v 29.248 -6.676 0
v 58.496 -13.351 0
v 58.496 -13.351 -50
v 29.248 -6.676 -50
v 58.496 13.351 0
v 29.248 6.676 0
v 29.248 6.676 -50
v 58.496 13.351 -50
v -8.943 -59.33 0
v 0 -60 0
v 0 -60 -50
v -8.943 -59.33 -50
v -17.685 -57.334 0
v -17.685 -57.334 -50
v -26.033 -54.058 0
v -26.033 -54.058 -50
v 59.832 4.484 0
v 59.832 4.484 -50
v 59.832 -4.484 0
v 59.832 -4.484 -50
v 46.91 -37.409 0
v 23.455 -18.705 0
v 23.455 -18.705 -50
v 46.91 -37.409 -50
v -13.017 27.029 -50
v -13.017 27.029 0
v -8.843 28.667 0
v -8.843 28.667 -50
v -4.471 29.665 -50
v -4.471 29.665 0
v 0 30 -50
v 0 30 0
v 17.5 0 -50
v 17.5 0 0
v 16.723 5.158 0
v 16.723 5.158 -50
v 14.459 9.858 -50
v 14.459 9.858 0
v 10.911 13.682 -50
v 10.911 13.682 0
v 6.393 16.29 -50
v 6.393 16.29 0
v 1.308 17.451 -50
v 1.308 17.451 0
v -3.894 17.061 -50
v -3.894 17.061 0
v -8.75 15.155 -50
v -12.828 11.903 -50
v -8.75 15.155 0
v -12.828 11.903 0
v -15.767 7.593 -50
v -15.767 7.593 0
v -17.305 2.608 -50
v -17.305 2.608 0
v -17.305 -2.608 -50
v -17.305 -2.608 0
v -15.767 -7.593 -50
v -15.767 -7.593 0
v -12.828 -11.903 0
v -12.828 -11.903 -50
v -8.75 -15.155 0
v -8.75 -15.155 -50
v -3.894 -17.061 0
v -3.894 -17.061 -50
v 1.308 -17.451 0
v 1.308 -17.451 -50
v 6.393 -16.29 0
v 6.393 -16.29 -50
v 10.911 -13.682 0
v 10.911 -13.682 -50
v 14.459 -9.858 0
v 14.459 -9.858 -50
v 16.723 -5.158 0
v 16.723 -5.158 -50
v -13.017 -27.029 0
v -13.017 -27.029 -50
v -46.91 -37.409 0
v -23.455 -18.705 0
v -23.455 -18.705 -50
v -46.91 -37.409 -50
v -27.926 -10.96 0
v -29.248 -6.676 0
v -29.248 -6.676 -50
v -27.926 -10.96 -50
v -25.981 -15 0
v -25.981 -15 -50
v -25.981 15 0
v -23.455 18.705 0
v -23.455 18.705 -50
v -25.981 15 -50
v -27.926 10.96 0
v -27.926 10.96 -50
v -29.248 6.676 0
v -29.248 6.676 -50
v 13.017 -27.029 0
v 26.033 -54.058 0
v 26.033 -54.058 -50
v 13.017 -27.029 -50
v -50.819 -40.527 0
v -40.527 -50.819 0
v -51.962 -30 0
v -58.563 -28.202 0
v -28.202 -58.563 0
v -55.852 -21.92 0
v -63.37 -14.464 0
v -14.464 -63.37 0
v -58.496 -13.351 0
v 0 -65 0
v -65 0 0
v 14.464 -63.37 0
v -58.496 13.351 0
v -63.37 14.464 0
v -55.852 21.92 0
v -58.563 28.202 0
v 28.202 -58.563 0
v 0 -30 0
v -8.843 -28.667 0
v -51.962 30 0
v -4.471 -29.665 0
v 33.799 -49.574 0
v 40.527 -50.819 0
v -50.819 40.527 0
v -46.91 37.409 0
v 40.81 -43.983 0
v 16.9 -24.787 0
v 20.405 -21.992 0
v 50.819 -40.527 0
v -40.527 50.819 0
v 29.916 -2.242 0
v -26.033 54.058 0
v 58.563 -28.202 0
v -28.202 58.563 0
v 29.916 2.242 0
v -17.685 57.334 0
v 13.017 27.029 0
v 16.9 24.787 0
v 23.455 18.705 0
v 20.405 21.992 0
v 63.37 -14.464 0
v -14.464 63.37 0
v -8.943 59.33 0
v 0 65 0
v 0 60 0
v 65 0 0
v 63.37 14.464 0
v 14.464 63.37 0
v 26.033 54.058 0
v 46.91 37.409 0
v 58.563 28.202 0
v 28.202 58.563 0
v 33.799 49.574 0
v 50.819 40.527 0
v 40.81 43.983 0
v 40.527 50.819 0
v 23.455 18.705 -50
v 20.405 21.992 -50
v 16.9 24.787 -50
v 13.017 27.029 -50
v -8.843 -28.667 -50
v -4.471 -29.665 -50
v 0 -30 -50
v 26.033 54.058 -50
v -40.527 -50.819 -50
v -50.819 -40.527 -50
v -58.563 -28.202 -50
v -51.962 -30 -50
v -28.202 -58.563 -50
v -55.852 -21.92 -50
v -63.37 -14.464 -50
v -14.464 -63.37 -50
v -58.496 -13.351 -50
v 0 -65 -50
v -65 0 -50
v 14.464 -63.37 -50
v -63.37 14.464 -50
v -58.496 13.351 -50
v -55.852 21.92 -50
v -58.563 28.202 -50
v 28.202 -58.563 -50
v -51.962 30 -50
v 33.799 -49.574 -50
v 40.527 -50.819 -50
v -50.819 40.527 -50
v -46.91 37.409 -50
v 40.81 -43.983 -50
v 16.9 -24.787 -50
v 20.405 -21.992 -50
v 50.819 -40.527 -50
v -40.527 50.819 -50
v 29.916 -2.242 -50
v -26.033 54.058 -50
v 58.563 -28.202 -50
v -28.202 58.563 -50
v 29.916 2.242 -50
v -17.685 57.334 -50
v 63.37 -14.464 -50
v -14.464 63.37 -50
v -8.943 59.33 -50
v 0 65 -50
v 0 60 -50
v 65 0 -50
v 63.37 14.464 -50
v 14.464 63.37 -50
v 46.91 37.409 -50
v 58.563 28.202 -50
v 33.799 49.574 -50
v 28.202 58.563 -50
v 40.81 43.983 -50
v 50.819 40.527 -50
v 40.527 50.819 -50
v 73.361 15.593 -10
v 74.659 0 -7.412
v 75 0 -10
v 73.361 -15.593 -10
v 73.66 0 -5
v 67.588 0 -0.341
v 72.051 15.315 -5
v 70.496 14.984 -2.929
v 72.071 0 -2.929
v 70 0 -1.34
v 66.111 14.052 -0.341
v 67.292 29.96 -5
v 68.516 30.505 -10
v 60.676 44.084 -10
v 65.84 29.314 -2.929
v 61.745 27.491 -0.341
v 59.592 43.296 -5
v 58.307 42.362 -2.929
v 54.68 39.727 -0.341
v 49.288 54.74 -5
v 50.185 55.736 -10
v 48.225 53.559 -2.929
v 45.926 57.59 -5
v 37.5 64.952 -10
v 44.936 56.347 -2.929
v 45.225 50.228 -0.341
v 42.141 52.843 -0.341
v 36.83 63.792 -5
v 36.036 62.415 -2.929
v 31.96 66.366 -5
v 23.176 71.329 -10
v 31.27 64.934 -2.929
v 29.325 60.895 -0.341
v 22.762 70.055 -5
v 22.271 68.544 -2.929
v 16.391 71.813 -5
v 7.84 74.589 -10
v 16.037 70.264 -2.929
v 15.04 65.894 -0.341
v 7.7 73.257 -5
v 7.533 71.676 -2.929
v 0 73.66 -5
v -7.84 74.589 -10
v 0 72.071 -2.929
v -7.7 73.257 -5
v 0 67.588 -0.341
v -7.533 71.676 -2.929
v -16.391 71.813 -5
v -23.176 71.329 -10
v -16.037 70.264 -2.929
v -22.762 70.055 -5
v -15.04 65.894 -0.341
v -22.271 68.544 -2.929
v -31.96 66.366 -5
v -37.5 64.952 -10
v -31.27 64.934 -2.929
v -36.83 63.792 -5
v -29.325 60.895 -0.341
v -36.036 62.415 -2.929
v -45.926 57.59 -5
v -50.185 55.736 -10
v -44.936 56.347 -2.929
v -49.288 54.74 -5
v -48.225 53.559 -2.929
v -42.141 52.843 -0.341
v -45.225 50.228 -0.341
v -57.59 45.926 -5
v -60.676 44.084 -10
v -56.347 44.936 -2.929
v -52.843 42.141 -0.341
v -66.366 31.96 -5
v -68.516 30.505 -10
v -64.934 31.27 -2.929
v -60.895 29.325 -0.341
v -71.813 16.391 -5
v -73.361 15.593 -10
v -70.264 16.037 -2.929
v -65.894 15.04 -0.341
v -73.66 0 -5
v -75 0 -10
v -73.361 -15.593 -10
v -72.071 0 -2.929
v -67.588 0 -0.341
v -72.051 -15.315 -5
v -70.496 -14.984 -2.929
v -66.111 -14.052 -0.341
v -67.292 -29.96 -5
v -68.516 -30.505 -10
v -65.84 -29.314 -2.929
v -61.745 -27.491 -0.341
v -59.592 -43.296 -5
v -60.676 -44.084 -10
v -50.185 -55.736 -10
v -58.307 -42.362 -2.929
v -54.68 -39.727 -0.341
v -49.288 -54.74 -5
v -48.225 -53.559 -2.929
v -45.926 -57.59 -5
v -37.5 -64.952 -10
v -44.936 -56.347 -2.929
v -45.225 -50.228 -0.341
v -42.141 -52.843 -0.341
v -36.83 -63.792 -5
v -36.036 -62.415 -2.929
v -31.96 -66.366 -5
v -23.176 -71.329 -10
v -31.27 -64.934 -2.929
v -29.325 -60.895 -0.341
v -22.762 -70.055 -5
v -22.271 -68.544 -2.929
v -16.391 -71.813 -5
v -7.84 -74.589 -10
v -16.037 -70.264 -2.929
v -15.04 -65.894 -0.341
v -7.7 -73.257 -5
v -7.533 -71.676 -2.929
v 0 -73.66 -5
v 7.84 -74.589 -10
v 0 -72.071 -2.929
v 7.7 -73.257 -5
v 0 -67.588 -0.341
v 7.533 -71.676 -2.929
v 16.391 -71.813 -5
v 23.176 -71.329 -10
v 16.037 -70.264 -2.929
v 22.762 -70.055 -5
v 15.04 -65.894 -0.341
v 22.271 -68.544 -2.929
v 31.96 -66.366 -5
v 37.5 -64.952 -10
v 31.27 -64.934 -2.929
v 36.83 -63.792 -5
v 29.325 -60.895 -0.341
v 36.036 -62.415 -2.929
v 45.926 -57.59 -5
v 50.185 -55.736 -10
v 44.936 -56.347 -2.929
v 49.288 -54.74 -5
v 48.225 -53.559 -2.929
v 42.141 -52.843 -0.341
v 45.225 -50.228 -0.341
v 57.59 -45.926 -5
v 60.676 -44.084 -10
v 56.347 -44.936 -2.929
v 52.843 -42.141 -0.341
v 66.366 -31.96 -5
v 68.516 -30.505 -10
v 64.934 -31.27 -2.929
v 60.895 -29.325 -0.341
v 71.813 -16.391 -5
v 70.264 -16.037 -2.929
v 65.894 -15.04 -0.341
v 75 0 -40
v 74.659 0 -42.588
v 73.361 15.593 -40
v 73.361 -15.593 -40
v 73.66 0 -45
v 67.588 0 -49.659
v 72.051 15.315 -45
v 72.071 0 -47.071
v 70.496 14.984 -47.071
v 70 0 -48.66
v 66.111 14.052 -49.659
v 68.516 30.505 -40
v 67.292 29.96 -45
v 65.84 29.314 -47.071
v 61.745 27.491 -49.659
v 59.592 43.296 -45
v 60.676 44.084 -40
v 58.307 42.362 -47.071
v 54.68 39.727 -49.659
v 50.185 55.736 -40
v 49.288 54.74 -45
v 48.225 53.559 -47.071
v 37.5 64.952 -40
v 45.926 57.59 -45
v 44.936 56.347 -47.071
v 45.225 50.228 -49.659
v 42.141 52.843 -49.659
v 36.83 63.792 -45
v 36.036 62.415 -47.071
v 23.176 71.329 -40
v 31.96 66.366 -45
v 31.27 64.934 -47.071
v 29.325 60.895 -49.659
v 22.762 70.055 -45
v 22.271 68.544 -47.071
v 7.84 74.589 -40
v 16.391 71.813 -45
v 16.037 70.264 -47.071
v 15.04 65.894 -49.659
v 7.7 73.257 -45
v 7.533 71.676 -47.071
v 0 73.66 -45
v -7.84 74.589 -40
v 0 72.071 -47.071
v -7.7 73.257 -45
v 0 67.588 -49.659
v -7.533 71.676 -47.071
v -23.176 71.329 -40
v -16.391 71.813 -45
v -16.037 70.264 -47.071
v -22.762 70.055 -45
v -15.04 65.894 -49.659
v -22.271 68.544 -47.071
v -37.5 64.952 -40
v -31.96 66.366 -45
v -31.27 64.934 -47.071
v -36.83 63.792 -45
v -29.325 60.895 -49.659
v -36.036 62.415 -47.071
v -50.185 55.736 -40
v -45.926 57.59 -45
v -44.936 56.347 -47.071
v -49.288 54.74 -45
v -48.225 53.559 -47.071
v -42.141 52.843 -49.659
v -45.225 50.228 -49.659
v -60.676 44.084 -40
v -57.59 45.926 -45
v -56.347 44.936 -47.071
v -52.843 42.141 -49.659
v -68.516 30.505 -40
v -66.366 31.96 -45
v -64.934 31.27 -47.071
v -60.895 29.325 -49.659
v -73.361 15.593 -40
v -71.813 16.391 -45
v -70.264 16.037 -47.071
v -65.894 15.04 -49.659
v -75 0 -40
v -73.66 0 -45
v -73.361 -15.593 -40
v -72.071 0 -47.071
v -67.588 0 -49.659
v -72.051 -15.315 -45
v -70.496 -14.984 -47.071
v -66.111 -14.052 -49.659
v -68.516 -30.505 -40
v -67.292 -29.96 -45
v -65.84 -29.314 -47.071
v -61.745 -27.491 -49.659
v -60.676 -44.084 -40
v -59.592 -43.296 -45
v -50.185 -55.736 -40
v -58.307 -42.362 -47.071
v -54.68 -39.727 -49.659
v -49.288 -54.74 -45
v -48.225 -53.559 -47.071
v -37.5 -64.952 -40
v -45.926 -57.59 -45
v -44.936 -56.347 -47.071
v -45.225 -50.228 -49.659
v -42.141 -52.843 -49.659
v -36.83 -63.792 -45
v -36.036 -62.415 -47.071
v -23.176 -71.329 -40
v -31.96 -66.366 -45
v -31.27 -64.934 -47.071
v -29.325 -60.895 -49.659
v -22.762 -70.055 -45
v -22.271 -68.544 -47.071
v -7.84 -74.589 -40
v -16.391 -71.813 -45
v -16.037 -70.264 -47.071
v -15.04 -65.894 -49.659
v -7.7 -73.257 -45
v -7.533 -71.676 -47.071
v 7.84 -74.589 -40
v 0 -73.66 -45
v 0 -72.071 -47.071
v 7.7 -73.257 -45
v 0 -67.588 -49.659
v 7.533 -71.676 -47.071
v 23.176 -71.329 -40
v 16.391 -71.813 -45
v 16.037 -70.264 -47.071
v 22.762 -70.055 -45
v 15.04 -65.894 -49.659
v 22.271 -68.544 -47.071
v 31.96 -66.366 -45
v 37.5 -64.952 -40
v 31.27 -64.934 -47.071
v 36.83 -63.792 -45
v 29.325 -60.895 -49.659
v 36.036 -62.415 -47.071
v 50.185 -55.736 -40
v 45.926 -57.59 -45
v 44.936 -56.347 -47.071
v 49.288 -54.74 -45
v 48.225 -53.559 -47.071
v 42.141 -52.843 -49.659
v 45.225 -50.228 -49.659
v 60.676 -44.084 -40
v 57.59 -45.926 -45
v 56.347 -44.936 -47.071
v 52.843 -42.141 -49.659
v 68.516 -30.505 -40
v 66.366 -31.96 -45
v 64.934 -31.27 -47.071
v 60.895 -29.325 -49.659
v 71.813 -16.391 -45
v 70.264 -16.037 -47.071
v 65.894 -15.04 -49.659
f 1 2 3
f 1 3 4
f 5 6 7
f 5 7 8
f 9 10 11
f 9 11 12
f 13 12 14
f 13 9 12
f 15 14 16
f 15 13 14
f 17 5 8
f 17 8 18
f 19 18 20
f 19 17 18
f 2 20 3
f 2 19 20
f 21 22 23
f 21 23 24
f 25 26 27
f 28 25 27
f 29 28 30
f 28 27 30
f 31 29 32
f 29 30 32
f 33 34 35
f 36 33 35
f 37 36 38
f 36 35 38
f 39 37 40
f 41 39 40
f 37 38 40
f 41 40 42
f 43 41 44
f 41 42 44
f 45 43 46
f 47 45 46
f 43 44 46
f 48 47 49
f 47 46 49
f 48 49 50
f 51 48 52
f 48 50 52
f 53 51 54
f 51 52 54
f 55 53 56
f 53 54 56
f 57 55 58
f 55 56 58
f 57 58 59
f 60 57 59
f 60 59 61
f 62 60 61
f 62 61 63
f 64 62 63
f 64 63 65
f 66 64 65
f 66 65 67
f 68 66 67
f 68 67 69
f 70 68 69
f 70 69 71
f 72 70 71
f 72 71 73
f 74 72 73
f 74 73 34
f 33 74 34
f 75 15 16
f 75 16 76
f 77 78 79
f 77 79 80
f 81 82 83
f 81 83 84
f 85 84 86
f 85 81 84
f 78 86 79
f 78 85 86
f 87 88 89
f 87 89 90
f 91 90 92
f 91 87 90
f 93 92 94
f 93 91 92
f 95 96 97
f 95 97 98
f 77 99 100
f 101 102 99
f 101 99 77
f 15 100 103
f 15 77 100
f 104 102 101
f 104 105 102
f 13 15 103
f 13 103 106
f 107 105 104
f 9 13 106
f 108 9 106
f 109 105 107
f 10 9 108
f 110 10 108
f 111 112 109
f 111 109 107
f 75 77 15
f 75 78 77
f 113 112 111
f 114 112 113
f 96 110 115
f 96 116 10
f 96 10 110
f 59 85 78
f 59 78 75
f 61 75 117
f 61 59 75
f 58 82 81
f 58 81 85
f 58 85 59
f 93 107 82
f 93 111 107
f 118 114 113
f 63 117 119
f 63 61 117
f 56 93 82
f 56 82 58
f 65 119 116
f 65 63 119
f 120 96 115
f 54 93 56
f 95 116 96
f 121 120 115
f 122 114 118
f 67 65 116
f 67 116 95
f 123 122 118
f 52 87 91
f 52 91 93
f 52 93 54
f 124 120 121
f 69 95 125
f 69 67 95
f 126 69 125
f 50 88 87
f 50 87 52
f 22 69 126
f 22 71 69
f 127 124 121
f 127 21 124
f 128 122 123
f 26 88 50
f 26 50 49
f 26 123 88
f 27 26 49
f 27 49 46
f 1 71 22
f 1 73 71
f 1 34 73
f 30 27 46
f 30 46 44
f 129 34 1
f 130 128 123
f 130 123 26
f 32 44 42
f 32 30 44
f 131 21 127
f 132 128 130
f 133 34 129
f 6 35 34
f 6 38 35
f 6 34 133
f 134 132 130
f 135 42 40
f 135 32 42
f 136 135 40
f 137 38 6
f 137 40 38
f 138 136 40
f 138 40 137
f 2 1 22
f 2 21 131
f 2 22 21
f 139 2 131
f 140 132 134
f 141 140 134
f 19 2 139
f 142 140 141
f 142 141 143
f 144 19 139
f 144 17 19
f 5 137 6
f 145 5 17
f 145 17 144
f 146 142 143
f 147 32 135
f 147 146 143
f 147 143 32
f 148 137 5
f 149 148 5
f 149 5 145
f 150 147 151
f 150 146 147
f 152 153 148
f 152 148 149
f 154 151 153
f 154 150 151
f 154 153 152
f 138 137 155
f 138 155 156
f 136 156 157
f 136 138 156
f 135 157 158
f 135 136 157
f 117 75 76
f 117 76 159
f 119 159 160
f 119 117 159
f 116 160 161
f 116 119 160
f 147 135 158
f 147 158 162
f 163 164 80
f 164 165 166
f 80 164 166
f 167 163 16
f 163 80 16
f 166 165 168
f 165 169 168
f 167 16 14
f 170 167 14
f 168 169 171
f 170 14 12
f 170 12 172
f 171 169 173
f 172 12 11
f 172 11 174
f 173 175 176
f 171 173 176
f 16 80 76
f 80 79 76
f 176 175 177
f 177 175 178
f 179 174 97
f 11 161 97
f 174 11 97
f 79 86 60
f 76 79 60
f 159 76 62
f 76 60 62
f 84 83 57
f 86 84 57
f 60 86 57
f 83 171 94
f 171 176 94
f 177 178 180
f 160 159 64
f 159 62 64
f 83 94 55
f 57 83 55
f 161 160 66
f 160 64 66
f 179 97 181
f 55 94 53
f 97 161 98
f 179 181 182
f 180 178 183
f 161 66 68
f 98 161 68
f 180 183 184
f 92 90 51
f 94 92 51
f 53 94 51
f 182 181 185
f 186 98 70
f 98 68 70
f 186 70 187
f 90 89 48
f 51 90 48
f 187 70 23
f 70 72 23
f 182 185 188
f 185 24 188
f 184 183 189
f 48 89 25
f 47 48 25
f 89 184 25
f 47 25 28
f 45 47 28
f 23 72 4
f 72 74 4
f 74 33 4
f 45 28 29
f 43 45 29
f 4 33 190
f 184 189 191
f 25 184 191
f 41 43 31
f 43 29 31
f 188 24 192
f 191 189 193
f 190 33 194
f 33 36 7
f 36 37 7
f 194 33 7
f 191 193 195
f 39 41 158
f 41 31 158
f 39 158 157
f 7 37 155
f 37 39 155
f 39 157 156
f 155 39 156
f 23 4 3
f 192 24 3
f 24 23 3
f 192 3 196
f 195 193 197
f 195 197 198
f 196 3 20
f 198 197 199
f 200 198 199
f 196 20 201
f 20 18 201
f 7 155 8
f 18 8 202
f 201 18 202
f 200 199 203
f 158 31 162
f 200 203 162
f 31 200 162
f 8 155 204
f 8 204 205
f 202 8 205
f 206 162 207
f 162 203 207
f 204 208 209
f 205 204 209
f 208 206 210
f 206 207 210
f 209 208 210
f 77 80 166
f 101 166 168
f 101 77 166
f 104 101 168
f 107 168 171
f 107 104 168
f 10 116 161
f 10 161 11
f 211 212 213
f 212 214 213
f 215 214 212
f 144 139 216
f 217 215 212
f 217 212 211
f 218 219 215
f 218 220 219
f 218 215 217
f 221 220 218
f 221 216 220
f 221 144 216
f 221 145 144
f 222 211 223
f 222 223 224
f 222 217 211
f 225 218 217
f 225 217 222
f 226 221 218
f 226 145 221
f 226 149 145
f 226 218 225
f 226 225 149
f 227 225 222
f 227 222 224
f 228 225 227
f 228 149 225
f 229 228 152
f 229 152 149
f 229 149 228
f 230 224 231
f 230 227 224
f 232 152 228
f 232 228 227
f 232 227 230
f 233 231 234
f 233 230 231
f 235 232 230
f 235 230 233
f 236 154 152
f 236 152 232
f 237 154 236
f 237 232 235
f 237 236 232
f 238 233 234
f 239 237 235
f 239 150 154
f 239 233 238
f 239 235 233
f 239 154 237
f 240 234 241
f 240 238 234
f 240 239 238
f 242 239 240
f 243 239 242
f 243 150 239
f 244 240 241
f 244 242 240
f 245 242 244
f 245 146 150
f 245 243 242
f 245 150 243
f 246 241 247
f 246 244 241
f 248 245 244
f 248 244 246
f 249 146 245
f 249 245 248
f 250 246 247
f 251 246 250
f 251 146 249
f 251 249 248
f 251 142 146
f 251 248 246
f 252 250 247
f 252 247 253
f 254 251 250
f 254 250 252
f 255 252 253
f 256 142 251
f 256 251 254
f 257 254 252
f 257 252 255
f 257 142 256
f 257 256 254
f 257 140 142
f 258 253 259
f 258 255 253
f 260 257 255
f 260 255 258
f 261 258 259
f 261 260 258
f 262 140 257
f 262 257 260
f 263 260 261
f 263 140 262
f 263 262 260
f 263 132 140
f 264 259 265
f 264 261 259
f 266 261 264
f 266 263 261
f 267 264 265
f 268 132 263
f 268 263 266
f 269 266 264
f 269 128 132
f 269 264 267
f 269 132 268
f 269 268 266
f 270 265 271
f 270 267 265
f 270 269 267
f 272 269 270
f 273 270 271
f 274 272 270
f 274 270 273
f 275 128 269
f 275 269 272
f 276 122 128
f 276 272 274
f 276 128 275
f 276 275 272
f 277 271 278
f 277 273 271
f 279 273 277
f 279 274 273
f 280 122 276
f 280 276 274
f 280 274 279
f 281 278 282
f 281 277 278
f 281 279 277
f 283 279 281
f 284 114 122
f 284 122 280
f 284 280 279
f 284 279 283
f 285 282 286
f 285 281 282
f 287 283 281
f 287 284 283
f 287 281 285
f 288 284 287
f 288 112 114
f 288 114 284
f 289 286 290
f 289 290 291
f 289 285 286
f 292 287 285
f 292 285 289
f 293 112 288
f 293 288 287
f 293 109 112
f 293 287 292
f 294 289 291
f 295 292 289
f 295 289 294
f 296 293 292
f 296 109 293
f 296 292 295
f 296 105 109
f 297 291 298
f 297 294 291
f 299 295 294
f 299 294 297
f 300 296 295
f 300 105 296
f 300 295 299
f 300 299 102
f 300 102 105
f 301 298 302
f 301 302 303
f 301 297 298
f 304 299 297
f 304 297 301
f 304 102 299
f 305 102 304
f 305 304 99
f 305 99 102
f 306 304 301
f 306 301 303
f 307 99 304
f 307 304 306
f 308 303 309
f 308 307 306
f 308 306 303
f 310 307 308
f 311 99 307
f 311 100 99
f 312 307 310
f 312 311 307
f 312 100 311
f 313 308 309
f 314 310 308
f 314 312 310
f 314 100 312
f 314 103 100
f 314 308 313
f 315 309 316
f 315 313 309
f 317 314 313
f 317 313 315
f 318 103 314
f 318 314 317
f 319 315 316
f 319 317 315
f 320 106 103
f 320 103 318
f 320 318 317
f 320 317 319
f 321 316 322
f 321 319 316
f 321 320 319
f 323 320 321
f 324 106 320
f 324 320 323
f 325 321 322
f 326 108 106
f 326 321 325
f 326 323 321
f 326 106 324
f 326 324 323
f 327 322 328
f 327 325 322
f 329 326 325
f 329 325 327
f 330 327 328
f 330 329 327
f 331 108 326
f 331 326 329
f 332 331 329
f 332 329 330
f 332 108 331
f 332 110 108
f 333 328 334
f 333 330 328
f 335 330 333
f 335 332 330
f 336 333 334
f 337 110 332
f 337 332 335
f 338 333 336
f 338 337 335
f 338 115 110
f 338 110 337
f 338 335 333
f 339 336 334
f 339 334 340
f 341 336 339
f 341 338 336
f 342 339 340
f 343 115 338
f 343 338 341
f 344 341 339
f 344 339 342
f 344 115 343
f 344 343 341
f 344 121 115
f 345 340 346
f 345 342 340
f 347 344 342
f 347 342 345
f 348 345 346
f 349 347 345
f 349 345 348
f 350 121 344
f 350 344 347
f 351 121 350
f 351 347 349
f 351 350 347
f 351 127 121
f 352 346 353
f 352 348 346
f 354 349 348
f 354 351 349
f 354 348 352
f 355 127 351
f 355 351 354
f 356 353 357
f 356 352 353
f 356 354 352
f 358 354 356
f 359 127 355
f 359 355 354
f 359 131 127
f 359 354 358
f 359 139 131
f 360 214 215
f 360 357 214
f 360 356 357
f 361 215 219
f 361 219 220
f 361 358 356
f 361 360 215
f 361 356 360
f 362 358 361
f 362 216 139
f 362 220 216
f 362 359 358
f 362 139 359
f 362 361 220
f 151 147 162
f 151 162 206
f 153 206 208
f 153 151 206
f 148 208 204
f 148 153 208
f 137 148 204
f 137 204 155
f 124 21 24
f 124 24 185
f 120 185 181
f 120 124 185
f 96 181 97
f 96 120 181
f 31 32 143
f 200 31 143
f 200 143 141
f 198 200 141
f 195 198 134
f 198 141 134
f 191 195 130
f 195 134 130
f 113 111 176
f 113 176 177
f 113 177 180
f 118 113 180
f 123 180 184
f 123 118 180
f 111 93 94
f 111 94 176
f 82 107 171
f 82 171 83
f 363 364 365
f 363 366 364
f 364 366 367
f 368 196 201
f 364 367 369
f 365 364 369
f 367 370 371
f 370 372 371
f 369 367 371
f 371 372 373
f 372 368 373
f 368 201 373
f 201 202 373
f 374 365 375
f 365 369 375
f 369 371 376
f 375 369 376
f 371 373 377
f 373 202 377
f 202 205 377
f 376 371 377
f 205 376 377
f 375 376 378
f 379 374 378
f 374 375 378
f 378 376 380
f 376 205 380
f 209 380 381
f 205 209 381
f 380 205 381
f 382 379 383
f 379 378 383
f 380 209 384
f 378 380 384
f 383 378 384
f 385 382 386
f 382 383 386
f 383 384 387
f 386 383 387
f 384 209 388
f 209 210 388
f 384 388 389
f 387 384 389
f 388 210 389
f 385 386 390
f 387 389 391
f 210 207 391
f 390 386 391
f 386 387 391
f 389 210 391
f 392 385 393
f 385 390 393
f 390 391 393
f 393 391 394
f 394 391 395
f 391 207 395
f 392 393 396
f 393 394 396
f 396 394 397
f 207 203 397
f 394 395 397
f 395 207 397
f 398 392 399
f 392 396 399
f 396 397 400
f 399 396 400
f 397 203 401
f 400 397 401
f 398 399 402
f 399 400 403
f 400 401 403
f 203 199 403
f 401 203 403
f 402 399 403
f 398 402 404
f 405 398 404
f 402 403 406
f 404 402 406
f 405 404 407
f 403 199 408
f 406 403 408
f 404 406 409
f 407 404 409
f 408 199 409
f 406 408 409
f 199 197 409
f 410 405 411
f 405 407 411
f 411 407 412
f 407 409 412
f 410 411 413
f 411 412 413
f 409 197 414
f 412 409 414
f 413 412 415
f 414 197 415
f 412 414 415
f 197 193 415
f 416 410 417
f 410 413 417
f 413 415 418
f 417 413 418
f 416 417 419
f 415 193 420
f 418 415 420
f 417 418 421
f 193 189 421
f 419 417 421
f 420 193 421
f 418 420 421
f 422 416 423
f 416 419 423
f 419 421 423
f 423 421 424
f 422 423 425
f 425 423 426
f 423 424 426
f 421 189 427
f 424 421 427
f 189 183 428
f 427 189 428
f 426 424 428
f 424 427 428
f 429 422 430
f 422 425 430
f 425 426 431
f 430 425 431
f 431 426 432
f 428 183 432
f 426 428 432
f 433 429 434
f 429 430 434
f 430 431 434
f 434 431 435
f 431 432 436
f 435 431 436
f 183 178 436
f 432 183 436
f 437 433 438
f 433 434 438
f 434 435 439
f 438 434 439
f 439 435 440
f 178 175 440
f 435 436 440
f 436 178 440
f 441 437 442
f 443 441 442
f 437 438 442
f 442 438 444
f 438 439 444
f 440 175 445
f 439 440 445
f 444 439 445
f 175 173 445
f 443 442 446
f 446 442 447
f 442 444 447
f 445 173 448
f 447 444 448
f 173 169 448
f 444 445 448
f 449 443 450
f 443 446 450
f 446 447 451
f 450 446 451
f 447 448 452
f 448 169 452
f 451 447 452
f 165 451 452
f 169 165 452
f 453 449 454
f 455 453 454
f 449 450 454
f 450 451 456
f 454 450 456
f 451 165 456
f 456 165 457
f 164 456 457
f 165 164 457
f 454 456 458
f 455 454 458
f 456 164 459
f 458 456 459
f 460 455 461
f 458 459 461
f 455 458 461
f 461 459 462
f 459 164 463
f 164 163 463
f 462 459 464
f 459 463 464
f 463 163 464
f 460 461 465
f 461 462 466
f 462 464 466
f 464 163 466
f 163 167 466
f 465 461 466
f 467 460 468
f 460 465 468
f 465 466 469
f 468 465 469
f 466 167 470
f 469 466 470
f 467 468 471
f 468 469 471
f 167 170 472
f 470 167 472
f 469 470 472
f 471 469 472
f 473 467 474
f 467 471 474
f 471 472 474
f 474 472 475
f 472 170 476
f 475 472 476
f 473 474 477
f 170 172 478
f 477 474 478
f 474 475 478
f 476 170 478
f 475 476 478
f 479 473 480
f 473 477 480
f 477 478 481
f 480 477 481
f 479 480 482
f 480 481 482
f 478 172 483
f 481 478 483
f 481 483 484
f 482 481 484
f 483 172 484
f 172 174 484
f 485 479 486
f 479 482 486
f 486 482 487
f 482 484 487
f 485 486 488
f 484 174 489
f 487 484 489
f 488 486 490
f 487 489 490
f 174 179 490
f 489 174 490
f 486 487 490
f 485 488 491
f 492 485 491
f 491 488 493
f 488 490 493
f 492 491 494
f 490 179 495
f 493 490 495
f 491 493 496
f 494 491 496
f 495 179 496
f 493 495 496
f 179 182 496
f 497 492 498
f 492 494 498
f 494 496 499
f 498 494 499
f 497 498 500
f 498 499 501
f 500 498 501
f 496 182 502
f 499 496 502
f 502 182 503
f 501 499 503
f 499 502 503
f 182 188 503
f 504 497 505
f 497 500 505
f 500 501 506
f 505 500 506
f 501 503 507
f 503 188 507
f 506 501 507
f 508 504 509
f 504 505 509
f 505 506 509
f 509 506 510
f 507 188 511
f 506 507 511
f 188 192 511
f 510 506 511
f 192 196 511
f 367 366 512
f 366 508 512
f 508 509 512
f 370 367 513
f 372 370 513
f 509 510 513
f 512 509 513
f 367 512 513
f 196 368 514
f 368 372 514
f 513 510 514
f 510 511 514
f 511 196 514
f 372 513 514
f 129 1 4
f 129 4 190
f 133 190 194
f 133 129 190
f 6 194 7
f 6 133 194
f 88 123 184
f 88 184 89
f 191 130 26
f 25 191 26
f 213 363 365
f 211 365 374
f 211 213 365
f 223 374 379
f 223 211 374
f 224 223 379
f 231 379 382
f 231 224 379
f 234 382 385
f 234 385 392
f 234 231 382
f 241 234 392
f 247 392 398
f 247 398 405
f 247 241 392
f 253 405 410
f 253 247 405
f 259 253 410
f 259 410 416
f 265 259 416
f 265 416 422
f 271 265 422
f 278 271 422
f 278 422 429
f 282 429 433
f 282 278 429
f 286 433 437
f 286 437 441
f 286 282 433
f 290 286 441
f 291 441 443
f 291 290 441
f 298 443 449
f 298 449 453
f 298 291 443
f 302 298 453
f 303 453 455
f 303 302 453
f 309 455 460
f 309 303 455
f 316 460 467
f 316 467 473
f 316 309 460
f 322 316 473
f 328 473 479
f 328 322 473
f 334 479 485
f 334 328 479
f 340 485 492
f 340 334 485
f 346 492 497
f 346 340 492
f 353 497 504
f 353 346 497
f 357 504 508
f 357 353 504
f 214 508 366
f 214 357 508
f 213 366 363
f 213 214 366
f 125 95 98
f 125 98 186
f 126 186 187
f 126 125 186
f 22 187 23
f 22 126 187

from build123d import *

# Parameters (mm, degrees)
SKETCH1_R           = 75
BOSS_EXTRUDE1_DEPTH = 50
FILLET1_R           = 10
SKETCH4_R           = 17.5
CUT_EXTRUDE1_DEPTH  = 51.0000001


with BuildPart() as part:
    # Sketch1 → Boss-Extrude1 (new body)
    with BuildSketch(Plane.XY):
        Circle(SKETCH1_R)
        with BuildLine():
            Line((0, 30), (0, 60))
            ThreePointArc((0, 60), (-13.351256037, 58.495674731), (-26.033024347, 54.058132074))
            Line((-26.033024347, 54.058132074), (-13.016512174, 27.029066037))
            ThreePointArc((-13.016512174, 27.029066037), (-6.675628019, 29.247837365), (0, 30))
        make_face(mode=Mode.SUBTRACT)
        with BuildLine():
            Line((13.016512174, 27.029066037), (26.033024347, 54.058132074))
            ThreePointArc((26.033024347, 54.058132074), (37.409388112, 46.909888948), (46.909888948, 37.409388112))
            Line((46.909888948, 37.409388112), (23.454944474, 18.704694056))
            ThreePointArc((23.454944474, 18.704694056), (18.704694056, 23.454944474), (13.016512174, 27.029066037))
        make_face(mode=Mode.SUBTRACT)
        with BuildLine():
            Line((29.247837365, 6.675628019), (58.495674731, 13.351256037))
            ThreePointArc((58.495674731, 13.351256037), (60, 0), (58.495674731, -13.351256037))
            Line((58.495674731, -13.351256037), (29.247837365, -6.675628019))
            ThreePointArc((29.247837365, -6.675628019), (30, 0), (29.247837365, 6.675628019))
        make_face(mode=Mode.SUBTRACT)
        with BuildLine():
            Line((23.454944474, -18.704694056), (46.909888948, -37.409388112))
            ThreePointArc((46.909888948, -37.409388112), (37.409388112, -46.909888948), (26.033024347, -54.058132074))
            Line((26.033024347, -54.058132074), (13.016512174, -27.029066037))
            ThreePointArc((13.016512174, -27.029066037), (18.704694056, -23.454944474), (23.454944474, -18.704694056))
        make_face(mode=Mode.SUBTRACT)
        with BuildLine():
            Line((0, -30), (0, -60))
            ThreePointArc((0, -60), (-13.351256037, -58.495674731), (-26.033024347, -54.058132074))
            Line((-26.033024347, -54.058132074), (-13.016512174, -27.029066037))
            ThreePointArc((-13.016512174, -27.029066037), (-6.675628019, -29.247837365), (0, -30))
        make_face(mode=Mode.SUBTRACT)
        with BuildLine():
            Line((-23.454944474, -18.704694056), (-46.909888948, -37.409388112))
            ThreePointArc((-46.909888948, -37.409388112), (-54.058132074, -26.033024347), (-58.495674731, -13.351256037))
            Line((-58.495674731, -13.351256037), (-29.247837365, -6.675628019))
            ThreePointArc((-29.247837365, -6.675628019), (-27.029066037, -13.016512174), (-23.454944474, -18.704694056))
        make_face(mode=Mode.SUBTRACT)
        with BuildLine():
            Line((-29.247837365, 6.675628019), (-58.495674731, 13.351256037))
            ThreePointArc((-58.495674731, 13.351256037), (-54.058132074, 26.033024347), (-46.909888948, 37.409388112))
            Line((-46.909888948, 37.409388112), (-23.454944474, 18.704694056))
            ThreePointArc((-23.454944474, 18.704694056), (-27.029066037, 13.016512174), (-29.247837365, 6.675628019))
        make_face(mode=Mode.SUBTRACT)
    extrude(amount=-BOSS_EXTRUDE1_DEPTH)

    # Fillet1
    fillet1_edges = [part.edges().sort_by_distance(p)[0] for p in [
        (-75, 0, 0),
        (-75, 0, -50),
    ]]
    fillet(fillet1_edges, radius=FILLET1_R)

    # Sketch4 → Cut-Extrude1 (cut, through all)
    with BuildSketch(Plane.XY):
        Circle(SKETCH4_R)
    extrude(amount=-CUT_EXTRUDE1_DEPTH, mode=Mode.SUBTRACT)


solid = part.part
